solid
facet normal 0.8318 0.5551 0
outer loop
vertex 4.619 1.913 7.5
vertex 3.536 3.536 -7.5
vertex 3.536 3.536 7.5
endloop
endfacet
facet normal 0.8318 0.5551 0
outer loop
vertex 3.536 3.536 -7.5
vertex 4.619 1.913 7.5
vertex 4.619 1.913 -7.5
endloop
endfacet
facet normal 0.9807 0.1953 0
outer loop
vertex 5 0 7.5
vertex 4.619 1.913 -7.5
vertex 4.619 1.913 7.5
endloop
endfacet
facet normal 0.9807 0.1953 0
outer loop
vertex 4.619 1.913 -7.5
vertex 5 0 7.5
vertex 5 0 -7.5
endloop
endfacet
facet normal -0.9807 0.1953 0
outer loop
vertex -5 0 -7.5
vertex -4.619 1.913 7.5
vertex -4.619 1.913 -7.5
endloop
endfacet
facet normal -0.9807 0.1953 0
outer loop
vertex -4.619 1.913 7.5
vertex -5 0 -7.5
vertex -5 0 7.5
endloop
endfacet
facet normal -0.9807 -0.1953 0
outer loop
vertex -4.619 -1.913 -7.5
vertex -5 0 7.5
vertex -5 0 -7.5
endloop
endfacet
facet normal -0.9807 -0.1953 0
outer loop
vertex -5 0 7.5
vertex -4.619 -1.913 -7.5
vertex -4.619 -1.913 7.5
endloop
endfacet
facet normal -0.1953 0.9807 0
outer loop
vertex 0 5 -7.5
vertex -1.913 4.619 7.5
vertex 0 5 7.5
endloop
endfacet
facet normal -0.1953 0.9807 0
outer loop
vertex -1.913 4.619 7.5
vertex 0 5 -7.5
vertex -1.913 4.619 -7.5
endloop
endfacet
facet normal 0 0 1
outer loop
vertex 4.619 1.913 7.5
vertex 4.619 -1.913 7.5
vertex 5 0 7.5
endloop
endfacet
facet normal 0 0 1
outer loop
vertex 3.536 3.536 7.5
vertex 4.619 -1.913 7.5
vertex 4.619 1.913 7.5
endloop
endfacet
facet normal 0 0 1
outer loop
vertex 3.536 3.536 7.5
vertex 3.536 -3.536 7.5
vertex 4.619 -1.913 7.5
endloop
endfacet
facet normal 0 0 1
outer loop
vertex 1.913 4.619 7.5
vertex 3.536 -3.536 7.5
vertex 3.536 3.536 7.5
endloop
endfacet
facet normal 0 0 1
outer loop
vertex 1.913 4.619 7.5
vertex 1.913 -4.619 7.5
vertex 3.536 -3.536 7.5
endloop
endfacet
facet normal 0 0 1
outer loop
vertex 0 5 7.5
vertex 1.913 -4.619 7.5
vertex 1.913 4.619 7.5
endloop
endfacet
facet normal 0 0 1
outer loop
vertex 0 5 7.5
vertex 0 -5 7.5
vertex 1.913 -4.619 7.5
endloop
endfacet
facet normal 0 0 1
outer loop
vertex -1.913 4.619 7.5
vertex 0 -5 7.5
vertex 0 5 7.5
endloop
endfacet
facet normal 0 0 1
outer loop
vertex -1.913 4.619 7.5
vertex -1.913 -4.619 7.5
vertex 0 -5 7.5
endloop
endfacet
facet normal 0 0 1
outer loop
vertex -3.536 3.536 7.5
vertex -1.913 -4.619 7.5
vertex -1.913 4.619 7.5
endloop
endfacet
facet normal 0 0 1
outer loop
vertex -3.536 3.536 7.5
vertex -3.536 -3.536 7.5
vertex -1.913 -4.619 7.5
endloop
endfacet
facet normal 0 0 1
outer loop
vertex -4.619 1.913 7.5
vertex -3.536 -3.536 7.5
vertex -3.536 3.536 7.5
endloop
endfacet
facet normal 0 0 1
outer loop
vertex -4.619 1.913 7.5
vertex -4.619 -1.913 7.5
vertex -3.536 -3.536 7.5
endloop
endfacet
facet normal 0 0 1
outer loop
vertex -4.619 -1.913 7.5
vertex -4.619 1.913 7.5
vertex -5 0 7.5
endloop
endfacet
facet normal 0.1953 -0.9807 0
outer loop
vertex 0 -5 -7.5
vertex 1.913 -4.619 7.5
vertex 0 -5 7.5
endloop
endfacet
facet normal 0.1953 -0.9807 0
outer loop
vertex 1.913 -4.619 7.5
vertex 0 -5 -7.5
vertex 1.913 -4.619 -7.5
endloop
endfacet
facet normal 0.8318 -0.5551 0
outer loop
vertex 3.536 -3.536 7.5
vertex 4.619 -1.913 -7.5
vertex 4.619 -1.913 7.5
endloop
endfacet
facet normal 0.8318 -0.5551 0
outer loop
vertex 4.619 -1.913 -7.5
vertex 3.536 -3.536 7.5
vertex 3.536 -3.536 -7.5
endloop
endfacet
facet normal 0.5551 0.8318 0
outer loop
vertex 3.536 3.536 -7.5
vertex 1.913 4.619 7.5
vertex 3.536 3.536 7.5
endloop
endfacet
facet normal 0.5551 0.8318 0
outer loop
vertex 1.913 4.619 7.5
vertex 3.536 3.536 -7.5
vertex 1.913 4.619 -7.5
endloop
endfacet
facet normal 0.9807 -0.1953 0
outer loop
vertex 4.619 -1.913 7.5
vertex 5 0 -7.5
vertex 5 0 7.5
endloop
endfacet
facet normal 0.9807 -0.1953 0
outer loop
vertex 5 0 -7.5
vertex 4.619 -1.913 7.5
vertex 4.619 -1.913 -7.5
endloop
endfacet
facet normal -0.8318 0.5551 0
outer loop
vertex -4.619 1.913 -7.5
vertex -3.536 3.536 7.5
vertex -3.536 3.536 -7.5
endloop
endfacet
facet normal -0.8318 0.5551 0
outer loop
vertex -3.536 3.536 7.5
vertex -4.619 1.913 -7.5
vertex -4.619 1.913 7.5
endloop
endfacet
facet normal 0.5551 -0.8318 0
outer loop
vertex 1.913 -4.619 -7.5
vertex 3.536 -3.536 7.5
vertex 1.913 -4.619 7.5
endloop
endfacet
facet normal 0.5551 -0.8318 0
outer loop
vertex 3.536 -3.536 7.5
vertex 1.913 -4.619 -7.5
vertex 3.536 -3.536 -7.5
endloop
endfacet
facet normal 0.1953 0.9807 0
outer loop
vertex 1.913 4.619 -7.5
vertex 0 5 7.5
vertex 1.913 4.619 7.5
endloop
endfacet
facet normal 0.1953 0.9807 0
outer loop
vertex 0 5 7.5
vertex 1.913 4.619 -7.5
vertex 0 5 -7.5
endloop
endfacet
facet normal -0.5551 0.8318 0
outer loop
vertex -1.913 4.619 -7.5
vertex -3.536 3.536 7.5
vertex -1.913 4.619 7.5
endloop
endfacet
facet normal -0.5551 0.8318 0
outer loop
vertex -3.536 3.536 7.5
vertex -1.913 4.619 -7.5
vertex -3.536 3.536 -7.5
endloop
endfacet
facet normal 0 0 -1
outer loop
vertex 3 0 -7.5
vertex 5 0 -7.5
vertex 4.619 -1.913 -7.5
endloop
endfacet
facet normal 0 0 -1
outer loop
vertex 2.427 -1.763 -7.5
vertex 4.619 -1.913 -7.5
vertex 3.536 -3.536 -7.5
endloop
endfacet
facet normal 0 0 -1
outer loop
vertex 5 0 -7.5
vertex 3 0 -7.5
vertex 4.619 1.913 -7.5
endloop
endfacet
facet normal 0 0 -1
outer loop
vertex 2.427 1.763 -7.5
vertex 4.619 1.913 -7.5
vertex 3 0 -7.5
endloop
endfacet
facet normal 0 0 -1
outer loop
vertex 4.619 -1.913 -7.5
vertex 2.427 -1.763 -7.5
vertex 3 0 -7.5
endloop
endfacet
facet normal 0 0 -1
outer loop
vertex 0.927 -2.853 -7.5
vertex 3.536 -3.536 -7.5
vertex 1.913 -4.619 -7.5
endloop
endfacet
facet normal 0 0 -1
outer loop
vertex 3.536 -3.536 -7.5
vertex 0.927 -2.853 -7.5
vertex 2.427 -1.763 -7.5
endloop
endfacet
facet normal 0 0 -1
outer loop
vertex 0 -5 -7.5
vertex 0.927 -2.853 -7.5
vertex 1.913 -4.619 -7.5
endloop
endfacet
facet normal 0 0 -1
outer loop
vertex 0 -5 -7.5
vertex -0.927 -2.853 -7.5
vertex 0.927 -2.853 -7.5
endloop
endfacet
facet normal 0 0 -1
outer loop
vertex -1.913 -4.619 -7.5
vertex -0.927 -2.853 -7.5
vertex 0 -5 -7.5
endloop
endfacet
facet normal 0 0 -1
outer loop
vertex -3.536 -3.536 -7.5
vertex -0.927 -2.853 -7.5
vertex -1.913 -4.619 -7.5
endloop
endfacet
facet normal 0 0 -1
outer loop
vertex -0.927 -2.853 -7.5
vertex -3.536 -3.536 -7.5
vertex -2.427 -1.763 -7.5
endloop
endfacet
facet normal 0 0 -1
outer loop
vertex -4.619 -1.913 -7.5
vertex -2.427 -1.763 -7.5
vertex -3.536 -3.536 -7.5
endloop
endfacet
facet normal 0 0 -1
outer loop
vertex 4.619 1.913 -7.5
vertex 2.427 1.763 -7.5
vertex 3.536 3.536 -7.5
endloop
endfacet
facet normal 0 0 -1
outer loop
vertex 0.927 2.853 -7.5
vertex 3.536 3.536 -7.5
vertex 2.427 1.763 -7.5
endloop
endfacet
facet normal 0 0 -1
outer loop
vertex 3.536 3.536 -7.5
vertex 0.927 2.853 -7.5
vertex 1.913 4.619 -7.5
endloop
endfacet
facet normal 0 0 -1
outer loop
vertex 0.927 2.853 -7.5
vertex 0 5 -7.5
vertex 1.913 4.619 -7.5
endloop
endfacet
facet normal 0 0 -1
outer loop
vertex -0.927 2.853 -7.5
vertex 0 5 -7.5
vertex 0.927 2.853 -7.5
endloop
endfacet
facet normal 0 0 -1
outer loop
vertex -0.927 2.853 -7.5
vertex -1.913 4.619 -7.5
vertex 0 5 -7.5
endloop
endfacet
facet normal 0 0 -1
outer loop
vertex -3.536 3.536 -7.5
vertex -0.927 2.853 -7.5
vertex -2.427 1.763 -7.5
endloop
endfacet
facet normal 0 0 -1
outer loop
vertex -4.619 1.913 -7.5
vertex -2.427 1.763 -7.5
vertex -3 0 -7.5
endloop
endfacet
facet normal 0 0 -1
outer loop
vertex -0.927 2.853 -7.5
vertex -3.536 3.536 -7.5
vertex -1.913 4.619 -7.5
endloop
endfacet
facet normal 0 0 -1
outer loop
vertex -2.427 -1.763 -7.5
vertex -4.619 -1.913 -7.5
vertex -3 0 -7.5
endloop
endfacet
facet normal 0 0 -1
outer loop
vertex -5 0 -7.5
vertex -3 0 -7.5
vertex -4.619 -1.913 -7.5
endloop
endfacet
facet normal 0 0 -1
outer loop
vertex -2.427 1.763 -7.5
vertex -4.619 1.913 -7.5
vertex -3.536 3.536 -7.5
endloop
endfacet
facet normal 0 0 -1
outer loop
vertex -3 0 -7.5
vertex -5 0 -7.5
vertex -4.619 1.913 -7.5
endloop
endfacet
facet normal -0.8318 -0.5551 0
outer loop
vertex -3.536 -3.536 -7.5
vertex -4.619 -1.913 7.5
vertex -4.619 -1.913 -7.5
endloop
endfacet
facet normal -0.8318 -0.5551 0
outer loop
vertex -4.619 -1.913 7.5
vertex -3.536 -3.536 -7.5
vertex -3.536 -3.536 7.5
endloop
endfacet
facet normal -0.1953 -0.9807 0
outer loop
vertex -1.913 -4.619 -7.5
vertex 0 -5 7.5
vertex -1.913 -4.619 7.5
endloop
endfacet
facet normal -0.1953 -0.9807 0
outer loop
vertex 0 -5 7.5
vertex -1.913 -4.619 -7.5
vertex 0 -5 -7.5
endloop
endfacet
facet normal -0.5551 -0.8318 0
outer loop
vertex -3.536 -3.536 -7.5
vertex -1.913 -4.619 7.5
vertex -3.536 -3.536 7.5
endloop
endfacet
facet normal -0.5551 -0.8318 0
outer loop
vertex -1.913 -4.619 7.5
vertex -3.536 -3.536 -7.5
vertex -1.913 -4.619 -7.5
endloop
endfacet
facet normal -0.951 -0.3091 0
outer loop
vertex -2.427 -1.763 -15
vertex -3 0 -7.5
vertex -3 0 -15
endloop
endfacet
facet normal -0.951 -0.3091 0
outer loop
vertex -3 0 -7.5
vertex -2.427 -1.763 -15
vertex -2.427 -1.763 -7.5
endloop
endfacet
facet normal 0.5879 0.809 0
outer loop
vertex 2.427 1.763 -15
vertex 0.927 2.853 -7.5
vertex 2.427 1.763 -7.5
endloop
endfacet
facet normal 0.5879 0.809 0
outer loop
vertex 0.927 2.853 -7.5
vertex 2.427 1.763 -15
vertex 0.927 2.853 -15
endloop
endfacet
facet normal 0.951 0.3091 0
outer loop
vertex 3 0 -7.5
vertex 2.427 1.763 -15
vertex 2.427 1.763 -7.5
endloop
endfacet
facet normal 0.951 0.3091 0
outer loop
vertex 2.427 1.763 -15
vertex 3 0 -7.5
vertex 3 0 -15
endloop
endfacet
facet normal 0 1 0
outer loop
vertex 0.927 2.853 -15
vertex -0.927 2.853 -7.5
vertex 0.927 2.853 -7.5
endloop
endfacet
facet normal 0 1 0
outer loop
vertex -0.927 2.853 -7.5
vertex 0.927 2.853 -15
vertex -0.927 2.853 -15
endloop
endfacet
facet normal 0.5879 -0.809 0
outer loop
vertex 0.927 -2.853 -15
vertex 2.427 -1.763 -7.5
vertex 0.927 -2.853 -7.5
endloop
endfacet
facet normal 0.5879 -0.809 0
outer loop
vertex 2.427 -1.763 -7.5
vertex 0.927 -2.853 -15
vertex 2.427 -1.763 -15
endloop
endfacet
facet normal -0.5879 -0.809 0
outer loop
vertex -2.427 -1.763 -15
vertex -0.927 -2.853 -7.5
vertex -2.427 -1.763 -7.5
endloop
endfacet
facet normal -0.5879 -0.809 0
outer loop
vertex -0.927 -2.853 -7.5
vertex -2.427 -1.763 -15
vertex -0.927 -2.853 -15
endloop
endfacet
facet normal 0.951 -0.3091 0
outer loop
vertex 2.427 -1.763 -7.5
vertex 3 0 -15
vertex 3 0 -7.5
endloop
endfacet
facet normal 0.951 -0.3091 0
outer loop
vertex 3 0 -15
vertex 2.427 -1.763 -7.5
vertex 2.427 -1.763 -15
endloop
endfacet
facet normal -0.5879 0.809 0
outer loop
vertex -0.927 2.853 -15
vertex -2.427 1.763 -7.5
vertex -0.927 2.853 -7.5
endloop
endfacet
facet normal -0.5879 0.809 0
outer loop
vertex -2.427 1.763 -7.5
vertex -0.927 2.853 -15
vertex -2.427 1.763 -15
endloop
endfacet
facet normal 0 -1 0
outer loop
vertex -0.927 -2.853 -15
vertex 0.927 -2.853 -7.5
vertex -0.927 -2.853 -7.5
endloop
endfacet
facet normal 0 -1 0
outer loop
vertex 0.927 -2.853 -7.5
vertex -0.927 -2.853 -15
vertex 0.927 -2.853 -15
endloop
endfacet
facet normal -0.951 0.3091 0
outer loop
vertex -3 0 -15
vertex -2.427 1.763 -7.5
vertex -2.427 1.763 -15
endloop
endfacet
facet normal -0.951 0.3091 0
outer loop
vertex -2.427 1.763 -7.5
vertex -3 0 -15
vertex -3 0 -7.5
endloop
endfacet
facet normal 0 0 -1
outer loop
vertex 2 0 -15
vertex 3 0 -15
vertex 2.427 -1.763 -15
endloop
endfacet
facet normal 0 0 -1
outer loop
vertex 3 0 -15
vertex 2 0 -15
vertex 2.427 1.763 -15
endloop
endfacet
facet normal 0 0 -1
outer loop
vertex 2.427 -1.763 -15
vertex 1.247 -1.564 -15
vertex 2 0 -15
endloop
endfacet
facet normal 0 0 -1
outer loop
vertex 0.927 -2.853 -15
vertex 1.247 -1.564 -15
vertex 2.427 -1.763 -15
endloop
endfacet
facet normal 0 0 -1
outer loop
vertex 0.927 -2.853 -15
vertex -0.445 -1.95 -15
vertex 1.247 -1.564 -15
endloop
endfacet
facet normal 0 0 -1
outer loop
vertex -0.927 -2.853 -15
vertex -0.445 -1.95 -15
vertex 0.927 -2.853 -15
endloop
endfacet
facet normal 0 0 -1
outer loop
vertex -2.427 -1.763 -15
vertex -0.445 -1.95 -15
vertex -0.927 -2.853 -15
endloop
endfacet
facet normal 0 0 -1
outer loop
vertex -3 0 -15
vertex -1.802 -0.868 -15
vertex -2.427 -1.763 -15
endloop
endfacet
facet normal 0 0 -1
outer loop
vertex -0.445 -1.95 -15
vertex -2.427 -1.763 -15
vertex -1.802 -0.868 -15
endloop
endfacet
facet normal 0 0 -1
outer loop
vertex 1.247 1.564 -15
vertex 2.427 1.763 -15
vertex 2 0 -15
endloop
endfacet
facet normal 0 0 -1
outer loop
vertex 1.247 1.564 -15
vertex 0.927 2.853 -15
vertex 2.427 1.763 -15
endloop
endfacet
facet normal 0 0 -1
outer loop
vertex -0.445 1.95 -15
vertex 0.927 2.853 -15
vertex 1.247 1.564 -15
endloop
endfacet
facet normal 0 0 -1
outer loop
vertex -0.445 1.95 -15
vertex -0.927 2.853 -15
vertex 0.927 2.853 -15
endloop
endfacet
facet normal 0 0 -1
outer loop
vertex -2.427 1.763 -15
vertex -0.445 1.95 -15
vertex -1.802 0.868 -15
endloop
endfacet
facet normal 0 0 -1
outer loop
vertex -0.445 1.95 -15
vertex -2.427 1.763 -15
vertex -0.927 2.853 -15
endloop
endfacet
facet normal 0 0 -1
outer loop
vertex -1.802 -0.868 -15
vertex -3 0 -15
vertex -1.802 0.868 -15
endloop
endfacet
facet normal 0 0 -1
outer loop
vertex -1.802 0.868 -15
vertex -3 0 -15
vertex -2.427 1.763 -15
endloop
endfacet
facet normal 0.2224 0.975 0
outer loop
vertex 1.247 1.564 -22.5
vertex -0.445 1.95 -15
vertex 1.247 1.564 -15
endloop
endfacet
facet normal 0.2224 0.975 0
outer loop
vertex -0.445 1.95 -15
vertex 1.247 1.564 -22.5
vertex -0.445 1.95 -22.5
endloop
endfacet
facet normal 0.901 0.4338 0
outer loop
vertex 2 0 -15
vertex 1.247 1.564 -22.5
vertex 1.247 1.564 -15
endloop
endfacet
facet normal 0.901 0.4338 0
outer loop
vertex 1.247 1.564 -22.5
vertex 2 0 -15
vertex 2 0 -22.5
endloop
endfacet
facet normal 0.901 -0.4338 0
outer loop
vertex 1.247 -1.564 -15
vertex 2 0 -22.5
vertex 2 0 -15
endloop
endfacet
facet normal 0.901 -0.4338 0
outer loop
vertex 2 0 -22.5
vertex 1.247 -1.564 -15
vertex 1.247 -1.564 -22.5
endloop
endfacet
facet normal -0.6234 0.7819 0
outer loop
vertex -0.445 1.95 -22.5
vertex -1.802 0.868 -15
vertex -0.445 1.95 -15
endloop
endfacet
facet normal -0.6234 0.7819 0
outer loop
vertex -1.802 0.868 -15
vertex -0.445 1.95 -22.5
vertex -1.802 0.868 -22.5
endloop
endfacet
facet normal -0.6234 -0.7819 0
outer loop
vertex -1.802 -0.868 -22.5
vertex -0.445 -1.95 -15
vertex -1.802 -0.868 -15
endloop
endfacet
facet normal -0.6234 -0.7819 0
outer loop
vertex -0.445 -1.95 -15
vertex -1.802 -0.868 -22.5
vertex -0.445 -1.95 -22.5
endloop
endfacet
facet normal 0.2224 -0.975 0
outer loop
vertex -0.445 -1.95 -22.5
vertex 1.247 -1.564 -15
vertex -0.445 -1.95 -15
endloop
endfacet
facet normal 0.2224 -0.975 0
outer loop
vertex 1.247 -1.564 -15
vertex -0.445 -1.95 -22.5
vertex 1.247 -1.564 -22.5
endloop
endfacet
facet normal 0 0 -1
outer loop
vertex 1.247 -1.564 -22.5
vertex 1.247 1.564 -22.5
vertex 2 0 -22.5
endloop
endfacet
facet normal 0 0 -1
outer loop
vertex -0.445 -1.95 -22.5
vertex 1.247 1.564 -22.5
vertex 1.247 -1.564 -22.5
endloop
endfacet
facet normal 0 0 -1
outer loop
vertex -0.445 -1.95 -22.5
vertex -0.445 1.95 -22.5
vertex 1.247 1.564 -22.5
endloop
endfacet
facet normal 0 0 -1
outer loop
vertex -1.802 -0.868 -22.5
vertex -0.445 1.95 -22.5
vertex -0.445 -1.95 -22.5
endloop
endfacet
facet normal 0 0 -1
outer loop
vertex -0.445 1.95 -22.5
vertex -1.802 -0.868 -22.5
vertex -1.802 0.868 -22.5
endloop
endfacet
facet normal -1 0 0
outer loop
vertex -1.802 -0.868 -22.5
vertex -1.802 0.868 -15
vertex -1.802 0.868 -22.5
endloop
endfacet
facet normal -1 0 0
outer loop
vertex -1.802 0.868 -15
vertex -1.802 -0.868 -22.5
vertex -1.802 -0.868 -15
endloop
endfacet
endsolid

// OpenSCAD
//
//   Code generated by ChatGPT for the query below
//
//   Can you write me OpenSCAD code to create a model of a teaspoon?
//
//   Created Jan 2023 by Jenny List, for a Hackaday article.
//


module teaspoon() {
  union() {
    cylinder(r=5, h=15, center=true);
    translate([0, 0, -7.5]) cylinder(r=3, h=15, center=true);
    translate([0, 0, -15]) cylinder(r=2, h=15, center=true);
  }
}

teaspoon();
